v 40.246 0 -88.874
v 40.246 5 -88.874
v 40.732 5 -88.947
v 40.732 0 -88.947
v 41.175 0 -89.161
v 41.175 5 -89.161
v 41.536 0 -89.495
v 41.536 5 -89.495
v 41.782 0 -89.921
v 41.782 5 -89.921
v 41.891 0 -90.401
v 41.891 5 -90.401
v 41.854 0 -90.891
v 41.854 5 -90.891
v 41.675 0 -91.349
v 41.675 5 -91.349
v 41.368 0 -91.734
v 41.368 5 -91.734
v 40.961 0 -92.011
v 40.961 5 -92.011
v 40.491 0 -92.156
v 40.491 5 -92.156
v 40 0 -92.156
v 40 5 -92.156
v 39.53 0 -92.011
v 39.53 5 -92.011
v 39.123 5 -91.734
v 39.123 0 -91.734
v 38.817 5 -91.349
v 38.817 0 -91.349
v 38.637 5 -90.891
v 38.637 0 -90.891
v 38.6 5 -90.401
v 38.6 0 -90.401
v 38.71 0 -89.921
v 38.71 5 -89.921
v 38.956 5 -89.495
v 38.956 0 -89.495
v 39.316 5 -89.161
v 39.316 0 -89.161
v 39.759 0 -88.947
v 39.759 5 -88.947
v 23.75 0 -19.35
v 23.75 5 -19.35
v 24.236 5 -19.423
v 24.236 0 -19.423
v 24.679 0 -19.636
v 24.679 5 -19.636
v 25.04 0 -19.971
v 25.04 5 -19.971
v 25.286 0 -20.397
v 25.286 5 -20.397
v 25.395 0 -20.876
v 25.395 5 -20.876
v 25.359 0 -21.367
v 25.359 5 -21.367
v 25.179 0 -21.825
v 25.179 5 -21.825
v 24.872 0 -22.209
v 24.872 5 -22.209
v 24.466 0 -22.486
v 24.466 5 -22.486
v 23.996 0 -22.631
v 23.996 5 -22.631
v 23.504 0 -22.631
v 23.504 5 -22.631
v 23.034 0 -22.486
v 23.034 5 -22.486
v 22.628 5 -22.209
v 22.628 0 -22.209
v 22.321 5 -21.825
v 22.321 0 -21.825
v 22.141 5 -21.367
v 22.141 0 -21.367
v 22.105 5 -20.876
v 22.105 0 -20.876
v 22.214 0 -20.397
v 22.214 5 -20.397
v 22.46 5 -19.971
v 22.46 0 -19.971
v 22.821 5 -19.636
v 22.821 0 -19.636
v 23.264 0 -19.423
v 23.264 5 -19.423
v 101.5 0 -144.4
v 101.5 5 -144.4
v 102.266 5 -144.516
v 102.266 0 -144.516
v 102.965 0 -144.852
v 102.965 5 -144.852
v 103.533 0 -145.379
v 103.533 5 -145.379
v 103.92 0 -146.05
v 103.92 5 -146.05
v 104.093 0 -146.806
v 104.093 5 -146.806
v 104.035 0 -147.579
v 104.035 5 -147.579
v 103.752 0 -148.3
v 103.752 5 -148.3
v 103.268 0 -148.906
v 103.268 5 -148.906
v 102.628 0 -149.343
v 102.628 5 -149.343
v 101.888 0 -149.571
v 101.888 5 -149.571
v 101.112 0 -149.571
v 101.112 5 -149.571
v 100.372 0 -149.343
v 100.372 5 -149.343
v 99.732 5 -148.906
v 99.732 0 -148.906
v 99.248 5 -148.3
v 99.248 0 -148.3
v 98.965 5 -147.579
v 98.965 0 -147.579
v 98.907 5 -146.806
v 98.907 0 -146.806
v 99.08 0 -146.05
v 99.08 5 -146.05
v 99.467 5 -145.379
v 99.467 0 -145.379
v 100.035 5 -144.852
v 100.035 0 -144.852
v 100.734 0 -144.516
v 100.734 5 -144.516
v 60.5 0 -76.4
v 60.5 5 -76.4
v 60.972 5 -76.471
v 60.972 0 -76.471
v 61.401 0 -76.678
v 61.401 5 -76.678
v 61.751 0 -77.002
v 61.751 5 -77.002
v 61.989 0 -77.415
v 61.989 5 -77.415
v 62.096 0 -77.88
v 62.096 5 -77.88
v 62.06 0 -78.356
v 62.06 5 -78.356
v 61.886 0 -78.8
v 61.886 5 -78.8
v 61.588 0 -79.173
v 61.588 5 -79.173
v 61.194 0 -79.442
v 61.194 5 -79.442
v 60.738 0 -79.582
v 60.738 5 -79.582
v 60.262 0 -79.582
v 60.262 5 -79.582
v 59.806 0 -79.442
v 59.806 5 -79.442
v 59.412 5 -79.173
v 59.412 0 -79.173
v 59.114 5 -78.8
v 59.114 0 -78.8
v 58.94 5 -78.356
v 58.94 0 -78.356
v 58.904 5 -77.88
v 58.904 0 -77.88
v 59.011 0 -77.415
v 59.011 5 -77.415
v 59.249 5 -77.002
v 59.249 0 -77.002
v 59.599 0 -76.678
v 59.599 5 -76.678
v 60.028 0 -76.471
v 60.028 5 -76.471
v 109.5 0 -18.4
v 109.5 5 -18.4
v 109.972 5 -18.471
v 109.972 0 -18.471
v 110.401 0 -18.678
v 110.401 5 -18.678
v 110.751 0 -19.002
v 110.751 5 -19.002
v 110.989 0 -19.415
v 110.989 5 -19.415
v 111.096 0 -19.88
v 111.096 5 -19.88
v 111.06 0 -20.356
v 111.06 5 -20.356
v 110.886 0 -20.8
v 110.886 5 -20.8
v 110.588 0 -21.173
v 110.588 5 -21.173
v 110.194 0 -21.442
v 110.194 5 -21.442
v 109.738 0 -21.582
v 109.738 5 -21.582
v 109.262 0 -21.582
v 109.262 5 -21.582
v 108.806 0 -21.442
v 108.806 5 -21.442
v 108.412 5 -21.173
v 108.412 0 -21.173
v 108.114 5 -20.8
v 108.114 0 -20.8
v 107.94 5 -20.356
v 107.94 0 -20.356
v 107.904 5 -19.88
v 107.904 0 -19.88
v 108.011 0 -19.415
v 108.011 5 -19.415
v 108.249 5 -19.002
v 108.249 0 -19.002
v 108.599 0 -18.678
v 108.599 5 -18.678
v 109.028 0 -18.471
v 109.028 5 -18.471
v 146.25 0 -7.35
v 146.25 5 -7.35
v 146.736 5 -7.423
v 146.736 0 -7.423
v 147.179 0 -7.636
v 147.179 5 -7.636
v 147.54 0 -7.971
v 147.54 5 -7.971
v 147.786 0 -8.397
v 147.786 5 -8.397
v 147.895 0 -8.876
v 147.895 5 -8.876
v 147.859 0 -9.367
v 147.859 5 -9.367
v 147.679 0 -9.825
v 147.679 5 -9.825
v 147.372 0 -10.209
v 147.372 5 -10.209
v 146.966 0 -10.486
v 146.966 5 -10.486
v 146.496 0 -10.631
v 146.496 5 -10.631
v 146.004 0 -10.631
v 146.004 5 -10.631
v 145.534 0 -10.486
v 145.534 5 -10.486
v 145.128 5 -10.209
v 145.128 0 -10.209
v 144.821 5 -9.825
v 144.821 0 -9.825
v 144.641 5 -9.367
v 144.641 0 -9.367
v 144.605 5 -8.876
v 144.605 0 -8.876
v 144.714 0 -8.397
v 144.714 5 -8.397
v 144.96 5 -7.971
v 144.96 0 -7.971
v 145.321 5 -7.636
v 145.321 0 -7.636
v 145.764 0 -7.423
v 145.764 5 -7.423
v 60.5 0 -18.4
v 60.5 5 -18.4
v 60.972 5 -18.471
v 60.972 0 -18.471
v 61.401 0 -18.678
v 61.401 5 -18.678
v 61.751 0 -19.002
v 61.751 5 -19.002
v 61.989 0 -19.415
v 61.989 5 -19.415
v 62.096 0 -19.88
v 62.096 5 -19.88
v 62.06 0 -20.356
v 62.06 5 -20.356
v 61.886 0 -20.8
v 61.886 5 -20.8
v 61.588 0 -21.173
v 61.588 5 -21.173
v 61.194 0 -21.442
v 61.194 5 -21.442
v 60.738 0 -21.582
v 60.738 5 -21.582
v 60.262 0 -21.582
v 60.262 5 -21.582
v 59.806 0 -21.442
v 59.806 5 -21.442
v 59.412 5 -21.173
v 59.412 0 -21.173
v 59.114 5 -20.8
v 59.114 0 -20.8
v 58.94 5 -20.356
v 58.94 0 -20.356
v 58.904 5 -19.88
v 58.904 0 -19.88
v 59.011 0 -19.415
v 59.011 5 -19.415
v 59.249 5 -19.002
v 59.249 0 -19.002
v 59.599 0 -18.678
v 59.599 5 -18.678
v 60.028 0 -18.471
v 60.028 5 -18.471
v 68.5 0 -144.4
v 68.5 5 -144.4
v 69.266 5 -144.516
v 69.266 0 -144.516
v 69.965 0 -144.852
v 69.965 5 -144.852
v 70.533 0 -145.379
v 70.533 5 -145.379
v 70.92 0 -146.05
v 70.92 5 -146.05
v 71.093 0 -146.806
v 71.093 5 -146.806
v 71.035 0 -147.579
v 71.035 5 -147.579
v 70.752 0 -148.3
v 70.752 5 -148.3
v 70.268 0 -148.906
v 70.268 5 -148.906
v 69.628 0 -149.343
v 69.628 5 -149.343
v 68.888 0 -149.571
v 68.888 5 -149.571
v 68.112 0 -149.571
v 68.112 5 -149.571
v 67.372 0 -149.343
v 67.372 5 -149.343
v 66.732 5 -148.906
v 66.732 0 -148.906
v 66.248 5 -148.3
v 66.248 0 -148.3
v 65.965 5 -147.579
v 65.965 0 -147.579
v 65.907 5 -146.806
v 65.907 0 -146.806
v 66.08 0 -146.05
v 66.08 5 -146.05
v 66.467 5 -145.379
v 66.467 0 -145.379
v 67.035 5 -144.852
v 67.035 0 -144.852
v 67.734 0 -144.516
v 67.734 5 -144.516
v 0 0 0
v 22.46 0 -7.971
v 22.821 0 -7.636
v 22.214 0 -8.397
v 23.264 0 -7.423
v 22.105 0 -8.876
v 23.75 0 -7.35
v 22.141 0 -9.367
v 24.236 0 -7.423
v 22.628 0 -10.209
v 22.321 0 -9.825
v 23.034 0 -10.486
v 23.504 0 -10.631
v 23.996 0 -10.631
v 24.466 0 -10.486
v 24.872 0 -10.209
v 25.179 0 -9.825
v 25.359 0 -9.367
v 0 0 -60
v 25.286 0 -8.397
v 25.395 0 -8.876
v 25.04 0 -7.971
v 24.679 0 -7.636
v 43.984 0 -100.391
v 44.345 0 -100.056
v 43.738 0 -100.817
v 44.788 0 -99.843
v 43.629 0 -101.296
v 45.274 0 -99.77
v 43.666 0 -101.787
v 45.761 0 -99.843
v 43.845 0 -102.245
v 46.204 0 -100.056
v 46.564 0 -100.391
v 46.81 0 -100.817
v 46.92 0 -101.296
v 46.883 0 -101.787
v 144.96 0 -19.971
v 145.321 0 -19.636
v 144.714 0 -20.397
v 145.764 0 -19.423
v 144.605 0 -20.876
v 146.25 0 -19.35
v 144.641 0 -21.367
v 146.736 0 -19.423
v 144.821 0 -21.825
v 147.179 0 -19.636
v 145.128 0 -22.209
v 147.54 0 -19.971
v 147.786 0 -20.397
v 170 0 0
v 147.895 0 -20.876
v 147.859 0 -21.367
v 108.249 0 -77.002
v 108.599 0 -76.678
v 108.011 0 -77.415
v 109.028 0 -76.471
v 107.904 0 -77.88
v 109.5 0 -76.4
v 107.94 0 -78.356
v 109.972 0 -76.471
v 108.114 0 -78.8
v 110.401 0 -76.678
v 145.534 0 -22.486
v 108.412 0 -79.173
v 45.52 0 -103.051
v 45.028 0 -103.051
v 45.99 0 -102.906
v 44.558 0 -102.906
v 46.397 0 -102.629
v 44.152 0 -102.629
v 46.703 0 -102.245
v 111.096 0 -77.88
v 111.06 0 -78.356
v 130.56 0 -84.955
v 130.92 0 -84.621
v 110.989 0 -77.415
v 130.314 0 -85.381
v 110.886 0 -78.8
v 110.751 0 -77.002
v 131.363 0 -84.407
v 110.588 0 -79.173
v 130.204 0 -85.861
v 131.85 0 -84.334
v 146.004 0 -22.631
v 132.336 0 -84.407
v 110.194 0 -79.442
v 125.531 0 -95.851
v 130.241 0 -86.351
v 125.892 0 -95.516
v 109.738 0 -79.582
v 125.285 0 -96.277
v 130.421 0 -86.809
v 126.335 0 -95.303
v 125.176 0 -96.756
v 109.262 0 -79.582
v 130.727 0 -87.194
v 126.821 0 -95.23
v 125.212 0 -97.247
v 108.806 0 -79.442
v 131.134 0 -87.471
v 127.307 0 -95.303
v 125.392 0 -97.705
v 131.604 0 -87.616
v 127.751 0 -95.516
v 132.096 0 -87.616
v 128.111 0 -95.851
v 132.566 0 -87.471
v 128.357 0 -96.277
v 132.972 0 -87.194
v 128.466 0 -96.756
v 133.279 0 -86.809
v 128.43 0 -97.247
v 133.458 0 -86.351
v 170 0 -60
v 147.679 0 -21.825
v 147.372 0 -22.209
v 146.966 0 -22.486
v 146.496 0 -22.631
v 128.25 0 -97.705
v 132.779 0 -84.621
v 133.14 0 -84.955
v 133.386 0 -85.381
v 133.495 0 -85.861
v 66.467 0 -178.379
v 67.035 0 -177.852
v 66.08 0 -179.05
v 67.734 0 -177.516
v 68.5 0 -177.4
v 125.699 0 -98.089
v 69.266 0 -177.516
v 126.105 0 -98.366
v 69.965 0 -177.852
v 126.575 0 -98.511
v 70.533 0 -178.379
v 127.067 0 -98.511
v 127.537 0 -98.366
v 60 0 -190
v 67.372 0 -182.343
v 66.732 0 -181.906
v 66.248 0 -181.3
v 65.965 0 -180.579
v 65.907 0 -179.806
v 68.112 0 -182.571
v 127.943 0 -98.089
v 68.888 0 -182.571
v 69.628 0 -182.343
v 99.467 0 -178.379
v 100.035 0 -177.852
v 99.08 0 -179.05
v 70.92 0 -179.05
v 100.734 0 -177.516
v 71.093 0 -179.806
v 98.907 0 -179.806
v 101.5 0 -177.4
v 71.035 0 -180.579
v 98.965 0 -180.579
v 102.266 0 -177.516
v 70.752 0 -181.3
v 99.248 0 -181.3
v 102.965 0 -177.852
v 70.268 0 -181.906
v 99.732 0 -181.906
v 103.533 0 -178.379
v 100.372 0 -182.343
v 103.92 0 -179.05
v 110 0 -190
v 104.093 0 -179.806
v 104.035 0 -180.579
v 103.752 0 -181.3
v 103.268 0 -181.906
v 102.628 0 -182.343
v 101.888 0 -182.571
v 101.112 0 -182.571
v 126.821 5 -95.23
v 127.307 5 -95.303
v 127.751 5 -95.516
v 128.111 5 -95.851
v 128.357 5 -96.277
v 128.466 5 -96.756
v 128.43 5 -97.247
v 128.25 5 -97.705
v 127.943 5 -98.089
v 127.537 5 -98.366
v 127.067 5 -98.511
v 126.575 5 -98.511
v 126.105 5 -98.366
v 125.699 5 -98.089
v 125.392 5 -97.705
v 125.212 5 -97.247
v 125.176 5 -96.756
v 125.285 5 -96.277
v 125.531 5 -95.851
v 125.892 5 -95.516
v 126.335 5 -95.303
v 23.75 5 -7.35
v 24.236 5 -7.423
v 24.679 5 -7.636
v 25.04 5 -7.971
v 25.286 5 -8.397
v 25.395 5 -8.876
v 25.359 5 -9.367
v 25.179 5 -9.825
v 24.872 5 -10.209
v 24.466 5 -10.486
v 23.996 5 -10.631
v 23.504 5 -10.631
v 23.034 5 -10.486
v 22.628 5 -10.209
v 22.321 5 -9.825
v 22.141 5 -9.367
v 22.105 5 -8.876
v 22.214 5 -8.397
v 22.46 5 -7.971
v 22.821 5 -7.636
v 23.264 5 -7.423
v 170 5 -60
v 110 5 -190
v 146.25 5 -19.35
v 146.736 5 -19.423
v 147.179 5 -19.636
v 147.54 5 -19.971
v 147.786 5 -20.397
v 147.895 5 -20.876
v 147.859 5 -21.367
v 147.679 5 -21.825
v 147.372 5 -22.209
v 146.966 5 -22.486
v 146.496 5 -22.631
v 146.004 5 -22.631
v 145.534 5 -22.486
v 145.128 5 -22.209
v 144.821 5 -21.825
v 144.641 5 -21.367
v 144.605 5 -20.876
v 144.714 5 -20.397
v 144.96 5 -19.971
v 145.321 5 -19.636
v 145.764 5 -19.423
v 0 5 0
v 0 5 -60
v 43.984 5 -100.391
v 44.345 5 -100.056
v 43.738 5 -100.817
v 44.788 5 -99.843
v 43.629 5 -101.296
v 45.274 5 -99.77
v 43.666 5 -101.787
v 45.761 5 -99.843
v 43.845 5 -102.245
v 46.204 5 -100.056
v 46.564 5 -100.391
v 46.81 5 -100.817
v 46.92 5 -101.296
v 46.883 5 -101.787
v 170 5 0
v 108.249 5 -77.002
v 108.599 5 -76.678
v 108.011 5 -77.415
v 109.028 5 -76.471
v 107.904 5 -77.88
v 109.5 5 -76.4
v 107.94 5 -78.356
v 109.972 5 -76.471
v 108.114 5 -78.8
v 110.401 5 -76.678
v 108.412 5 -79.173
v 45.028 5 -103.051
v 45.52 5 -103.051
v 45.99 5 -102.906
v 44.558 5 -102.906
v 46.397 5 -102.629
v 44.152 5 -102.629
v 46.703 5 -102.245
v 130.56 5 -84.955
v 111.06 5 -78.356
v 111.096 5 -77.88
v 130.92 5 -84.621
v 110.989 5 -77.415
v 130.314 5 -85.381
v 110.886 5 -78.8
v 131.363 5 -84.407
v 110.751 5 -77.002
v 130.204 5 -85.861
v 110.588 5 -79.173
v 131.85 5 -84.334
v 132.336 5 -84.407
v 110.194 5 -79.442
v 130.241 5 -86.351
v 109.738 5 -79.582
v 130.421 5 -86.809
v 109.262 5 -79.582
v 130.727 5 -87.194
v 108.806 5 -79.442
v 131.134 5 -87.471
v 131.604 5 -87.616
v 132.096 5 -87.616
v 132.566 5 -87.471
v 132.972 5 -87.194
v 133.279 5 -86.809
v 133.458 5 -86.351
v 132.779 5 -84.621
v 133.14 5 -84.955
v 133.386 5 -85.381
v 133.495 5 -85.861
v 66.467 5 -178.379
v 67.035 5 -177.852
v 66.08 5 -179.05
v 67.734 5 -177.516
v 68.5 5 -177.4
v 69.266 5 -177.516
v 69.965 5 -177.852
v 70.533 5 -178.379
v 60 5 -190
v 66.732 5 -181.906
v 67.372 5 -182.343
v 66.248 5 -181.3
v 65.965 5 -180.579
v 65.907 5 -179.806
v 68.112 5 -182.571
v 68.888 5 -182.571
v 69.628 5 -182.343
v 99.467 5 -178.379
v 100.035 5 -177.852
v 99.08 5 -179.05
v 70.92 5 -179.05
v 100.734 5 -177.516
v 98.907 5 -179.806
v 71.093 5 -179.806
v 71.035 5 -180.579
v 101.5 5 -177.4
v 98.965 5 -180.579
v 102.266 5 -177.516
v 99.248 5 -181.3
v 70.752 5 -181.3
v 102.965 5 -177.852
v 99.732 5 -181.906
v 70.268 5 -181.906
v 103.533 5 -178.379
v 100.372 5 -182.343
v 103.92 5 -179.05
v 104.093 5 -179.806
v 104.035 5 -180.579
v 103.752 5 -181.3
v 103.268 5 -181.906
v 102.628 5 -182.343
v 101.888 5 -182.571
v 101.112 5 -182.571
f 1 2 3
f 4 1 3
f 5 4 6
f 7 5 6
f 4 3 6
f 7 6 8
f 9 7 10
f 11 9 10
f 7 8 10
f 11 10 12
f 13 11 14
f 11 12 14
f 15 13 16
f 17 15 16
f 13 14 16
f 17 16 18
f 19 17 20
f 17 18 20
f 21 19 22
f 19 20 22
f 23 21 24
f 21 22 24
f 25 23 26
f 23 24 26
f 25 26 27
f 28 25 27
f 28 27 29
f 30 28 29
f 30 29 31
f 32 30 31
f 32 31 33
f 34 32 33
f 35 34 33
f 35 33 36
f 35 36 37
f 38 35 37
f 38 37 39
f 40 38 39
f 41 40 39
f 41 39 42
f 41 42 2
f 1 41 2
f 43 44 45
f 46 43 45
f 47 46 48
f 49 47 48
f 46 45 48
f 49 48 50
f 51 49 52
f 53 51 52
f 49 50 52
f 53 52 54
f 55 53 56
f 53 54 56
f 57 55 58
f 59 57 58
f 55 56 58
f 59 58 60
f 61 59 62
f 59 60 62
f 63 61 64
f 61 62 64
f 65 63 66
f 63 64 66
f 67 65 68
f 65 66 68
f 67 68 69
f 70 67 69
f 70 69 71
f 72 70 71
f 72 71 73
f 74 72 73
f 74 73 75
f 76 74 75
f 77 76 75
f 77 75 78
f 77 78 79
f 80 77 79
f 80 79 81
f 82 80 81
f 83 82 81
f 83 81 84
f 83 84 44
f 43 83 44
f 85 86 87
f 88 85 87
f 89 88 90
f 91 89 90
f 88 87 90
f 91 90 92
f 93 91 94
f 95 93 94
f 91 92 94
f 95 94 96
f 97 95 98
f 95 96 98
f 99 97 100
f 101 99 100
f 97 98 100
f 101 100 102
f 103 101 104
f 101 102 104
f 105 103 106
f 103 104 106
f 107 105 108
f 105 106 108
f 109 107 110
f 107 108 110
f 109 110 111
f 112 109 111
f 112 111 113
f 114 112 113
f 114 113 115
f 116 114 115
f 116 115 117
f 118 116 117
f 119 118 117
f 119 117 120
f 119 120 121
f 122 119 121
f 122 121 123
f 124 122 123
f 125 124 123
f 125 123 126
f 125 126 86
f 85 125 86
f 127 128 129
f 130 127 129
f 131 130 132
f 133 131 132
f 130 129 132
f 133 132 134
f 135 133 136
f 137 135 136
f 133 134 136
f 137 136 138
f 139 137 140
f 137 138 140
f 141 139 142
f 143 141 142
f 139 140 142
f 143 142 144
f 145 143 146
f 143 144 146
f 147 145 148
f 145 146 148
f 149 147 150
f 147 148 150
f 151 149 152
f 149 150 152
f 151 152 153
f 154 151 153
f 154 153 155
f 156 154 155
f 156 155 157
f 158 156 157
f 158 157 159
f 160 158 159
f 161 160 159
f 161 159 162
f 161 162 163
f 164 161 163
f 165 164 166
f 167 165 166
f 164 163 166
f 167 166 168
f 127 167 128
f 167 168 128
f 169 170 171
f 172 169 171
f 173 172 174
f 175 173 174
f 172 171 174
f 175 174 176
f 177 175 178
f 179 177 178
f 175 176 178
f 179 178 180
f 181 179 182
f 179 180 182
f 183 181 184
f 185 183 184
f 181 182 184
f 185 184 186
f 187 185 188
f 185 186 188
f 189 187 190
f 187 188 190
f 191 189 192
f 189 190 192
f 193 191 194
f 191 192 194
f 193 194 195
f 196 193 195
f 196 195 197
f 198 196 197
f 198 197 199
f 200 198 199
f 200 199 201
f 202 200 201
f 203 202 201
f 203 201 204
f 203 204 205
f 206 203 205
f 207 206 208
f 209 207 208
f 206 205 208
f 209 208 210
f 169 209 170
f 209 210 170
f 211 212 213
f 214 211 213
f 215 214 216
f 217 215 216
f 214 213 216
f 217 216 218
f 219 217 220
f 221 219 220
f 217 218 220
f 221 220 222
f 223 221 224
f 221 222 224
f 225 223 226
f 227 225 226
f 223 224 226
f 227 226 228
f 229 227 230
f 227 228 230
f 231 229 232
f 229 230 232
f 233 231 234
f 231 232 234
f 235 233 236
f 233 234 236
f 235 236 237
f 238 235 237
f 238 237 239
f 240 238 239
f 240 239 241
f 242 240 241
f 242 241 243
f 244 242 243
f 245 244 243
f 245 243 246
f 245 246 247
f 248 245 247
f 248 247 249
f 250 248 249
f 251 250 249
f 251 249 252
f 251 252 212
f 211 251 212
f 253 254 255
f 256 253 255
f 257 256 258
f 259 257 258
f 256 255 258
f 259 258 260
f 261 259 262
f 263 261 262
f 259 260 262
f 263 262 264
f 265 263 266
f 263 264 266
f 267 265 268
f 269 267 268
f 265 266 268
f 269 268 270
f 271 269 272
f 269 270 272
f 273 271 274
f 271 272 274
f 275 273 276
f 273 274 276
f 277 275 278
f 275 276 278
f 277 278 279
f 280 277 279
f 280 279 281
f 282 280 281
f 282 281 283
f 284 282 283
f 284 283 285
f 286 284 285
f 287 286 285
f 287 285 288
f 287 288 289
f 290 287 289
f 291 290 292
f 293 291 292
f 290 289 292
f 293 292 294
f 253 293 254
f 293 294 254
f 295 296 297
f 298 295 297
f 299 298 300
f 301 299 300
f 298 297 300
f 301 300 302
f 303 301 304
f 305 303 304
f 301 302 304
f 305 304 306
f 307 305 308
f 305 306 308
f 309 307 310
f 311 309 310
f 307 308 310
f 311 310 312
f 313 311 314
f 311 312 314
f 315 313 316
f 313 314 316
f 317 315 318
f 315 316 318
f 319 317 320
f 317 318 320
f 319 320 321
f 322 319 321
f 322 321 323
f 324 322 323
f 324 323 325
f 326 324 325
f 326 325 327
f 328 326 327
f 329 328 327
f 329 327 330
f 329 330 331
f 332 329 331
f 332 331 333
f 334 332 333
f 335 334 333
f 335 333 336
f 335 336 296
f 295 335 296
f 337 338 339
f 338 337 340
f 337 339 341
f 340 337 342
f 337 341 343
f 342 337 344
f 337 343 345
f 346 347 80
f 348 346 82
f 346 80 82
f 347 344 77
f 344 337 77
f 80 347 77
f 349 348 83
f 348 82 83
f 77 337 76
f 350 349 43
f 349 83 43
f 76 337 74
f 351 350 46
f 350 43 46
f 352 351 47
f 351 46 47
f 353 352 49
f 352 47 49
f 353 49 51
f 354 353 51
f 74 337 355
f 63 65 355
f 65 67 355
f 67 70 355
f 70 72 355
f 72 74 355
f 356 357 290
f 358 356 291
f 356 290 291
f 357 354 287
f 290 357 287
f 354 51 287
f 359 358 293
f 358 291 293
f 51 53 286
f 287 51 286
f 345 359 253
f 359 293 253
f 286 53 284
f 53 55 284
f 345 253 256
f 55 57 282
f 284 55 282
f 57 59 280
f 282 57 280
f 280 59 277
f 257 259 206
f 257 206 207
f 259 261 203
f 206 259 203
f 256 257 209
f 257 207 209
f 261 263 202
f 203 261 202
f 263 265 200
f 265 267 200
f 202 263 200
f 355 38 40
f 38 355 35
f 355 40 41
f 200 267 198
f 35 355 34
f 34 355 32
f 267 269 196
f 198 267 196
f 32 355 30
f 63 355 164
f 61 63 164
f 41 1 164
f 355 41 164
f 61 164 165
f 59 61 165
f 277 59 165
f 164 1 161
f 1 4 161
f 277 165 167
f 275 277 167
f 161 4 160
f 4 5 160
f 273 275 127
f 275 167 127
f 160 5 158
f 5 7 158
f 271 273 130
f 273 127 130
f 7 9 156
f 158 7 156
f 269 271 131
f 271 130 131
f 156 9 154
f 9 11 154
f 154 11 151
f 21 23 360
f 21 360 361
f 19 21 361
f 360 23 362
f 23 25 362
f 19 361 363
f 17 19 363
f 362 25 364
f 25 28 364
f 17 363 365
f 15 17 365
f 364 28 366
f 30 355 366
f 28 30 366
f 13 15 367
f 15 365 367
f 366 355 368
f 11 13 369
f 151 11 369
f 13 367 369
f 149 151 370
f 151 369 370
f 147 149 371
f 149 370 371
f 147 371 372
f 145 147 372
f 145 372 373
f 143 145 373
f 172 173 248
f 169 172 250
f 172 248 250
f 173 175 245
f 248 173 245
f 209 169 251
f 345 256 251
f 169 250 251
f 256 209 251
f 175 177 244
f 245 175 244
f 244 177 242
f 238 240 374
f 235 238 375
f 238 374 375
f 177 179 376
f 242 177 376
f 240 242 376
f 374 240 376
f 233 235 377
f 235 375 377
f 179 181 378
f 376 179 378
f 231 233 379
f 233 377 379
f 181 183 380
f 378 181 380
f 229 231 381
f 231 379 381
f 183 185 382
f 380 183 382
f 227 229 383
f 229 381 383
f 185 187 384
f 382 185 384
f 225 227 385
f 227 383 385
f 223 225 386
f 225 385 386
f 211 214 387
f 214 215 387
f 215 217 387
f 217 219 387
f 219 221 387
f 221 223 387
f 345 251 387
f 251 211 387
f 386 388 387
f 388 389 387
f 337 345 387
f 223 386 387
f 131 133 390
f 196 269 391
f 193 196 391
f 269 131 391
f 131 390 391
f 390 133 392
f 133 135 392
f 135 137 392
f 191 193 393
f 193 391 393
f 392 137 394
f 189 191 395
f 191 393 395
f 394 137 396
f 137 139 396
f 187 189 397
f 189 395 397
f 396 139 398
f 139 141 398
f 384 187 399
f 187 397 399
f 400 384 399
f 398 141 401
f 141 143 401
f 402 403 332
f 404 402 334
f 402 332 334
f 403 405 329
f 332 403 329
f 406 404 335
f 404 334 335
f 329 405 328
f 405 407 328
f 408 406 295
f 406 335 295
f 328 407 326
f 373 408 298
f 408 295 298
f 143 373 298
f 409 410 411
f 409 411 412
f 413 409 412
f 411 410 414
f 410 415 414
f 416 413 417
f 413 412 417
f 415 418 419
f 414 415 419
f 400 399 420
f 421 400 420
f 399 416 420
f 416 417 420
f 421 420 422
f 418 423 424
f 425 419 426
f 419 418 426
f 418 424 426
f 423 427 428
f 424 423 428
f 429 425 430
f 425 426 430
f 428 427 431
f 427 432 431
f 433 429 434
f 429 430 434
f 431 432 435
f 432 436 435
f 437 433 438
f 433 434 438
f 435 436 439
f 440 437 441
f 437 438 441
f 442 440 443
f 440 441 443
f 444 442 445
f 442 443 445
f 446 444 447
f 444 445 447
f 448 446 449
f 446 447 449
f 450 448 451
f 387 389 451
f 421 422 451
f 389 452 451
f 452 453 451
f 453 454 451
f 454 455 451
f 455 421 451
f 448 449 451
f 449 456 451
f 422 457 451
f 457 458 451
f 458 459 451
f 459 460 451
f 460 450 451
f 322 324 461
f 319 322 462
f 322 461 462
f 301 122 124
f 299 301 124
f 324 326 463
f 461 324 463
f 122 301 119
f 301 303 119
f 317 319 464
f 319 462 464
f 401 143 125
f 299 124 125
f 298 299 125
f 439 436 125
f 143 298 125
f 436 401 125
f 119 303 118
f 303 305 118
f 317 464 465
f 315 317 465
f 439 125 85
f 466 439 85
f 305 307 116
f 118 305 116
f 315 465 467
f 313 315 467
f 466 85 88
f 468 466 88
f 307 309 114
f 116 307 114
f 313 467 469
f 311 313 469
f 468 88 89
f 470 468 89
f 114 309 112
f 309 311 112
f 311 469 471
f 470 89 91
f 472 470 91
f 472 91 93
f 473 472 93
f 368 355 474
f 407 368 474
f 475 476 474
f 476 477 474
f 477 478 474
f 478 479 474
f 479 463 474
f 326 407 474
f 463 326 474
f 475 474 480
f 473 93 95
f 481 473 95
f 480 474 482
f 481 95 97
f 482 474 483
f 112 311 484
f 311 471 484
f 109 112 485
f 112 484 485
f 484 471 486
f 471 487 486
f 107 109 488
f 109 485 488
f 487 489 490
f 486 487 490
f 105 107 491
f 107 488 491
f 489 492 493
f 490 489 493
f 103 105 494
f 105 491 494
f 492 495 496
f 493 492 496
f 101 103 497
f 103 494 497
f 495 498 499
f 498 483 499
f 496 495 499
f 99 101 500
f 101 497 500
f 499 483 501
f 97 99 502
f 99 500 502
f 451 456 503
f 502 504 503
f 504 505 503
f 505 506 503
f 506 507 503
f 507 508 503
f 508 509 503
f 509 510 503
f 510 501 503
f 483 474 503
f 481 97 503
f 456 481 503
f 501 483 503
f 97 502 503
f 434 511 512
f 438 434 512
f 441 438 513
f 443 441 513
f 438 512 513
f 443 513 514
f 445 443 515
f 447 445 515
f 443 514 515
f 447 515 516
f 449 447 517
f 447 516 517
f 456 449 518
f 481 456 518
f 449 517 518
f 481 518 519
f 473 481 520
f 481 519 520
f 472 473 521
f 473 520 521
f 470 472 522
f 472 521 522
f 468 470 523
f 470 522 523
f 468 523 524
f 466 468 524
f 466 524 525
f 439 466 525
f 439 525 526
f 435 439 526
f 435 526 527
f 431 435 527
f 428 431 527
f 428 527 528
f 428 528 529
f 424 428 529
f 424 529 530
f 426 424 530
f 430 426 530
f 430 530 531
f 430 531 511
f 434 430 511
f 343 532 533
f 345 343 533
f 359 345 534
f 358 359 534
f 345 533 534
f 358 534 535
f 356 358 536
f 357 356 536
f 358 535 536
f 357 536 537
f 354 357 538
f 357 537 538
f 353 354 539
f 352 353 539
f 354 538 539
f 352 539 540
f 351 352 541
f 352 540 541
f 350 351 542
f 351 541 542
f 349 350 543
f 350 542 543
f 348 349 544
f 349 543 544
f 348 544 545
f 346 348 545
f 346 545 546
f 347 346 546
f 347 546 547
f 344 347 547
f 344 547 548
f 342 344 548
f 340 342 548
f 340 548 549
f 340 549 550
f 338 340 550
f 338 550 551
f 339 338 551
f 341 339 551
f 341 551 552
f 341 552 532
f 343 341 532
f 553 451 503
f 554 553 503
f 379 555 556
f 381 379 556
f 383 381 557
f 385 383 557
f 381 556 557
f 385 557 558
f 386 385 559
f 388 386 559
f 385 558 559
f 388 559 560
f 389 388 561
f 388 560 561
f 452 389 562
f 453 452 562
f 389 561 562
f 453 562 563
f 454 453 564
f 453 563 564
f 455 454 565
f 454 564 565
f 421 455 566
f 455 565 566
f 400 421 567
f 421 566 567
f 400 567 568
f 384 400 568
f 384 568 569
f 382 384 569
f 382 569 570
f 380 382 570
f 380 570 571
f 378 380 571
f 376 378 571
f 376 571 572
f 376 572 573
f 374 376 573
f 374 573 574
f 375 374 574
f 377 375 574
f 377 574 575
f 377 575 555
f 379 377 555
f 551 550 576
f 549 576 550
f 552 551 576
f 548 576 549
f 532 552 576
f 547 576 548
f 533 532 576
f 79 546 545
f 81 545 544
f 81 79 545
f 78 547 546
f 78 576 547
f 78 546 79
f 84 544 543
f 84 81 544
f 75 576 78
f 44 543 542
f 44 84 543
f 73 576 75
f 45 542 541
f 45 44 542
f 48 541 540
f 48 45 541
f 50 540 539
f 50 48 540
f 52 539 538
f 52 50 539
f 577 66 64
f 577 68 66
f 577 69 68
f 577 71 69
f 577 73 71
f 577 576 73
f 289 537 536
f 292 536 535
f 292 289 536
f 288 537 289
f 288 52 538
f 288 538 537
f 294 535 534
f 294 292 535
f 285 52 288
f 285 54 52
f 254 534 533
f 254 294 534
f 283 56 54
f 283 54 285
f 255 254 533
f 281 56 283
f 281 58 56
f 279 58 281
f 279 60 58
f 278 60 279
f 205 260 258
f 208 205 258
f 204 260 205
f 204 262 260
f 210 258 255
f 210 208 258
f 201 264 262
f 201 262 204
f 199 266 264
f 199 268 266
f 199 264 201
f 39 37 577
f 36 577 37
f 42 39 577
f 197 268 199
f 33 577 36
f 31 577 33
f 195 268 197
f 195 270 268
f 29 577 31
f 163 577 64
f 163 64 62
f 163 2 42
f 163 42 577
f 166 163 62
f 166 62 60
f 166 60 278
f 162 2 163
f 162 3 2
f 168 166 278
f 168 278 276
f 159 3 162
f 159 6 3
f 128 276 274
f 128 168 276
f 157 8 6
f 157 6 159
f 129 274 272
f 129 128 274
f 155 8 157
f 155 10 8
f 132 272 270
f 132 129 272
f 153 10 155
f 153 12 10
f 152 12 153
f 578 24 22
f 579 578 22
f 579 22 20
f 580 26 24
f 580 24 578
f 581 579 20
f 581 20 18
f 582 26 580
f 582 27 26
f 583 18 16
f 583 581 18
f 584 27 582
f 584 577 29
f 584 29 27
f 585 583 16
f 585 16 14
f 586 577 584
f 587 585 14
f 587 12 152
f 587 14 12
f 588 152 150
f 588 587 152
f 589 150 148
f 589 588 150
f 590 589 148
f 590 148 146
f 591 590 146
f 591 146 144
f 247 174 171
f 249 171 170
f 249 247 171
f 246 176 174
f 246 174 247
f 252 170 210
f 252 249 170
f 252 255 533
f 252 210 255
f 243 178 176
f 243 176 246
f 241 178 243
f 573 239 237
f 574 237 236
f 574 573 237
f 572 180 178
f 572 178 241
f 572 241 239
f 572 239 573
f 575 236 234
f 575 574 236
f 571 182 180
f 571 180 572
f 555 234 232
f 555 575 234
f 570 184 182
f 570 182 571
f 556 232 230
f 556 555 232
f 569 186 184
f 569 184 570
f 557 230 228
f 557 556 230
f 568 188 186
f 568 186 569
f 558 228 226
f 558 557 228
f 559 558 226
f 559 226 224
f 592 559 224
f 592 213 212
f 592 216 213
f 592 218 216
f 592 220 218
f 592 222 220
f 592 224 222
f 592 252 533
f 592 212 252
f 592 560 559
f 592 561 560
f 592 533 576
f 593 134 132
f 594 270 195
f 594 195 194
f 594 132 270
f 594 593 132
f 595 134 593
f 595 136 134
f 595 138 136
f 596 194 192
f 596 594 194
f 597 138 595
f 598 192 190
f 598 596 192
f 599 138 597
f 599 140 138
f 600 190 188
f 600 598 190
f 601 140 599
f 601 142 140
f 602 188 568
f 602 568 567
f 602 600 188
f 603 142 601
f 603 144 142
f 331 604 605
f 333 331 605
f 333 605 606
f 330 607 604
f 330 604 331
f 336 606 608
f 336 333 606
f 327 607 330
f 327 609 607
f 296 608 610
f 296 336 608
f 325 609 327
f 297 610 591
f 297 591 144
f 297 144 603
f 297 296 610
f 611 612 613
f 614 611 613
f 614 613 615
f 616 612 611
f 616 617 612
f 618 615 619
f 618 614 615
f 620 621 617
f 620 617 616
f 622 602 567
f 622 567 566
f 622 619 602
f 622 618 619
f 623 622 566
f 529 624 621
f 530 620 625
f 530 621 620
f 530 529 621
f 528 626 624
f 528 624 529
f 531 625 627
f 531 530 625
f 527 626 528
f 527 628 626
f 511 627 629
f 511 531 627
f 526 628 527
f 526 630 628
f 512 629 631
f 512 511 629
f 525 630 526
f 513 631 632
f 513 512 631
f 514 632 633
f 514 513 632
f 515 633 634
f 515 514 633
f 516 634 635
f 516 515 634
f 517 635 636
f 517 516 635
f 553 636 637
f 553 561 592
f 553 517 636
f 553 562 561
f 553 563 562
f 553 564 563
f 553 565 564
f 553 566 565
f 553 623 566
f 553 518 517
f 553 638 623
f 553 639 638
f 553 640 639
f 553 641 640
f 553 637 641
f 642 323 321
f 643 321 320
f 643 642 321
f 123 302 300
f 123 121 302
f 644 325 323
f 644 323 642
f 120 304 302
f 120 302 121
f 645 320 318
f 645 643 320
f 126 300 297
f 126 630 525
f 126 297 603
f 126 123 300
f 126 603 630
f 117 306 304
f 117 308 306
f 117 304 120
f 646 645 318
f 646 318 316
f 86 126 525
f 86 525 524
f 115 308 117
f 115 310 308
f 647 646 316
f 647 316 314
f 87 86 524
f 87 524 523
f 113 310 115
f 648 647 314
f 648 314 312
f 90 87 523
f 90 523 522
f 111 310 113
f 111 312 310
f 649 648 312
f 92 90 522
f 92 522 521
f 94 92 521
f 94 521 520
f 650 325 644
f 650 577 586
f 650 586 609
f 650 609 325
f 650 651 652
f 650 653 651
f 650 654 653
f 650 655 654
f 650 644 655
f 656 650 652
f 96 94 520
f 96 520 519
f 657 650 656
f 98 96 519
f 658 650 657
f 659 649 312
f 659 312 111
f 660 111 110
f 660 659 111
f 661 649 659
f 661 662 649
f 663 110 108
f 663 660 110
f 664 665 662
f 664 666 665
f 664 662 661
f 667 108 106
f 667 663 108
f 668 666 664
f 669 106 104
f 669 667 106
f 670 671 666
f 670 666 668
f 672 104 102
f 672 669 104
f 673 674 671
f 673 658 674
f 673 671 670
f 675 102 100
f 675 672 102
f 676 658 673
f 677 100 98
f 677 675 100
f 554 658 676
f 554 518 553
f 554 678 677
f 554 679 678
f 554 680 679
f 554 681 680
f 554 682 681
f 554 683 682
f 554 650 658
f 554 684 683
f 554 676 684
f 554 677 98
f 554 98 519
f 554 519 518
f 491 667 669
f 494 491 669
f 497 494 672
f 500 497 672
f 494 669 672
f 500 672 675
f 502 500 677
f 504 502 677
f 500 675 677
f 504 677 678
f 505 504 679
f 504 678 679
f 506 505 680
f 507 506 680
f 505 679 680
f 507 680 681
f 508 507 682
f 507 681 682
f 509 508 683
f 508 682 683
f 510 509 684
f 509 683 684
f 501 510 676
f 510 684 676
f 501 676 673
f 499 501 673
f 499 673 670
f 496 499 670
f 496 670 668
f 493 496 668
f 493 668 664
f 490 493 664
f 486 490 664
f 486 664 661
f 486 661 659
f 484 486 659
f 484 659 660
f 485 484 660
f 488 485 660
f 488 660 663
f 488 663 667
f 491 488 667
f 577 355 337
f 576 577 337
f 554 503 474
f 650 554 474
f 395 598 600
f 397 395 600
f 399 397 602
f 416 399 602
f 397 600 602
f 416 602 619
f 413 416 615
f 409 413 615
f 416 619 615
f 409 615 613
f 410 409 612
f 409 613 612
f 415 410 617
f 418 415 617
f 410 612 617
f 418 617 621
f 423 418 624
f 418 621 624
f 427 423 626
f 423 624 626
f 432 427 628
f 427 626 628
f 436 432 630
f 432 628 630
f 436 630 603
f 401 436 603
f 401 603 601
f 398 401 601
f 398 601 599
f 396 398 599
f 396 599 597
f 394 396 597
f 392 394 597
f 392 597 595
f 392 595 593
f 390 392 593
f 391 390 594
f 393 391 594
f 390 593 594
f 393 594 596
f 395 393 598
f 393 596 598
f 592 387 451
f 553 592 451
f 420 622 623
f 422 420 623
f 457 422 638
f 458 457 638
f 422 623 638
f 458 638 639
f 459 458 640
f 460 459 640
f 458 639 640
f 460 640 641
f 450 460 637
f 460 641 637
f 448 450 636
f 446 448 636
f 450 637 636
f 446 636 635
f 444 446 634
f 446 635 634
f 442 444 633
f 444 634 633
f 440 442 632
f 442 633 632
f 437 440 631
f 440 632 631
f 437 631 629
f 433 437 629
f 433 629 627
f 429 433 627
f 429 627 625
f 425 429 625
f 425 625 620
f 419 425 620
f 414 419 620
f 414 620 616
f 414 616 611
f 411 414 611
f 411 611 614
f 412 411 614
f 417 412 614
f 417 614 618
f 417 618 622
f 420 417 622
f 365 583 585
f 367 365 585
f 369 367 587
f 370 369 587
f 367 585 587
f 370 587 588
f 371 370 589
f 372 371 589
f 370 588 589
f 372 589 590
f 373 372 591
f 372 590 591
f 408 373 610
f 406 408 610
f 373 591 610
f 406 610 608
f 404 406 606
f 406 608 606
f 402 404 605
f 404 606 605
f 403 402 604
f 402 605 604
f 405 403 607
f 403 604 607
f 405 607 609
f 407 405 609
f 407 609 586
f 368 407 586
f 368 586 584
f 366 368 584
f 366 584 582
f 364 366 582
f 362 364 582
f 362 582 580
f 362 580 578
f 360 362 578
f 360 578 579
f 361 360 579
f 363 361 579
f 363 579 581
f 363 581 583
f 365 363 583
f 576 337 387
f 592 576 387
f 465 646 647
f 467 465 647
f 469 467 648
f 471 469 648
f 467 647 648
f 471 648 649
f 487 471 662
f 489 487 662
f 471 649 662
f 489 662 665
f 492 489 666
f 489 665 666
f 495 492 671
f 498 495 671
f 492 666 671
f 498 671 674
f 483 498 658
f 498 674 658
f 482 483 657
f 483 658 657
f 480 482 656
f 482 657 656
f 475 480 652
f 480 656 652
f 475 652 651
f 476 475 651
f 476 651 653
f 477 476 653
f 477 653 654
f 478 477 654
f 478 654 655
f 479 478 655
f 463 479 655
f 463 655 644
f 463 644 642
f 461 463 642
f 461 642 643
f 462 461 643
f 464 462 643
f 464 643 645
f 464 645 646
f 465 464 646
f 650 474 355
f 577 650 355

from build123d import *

# Parameters (mm, degrees)
EXTRUDE_1_DEPTH             = 5
SKETCH_2_R                  = 1.6
CUT_EXTRUDE_1_DEPTH         = 5
PATTERN_LINEAR_1_COUNT      = 2
PATTERN_LINEAR_1_PITCH      = 58
PATTERN_LINEAR_1_COUNT_DIR2 = 2
PATTERN_LINEAR_1_PITCH_DIR2 = 49
SKETCH_3_R                  = 2.6
CUT_EXTRUDE_2_DEPTH         = 10
PATTERN_LINEAR_2_COUNT      = 2
PATTERN_LINEAR_2_PITCH      = 33
PATTERN_LINEAR_2_COUNT_DIR2 = 2
PATTERN_LINEAR_2_PITCH_DIR2 = 33
SKETCH_4_R                  = 1.65
CUT_EXTRUDE_4_DEPTH         = 10


with BuildPart() as part:
    # Эскиз1 → Бобышка-Вытянуть1 (new body)
    with BuildSketch(Plane(origin=(0, 0, 0), x_dir=(1, 0, 0), z_dir=(0, 1, 0))):
        Polygon((0, 0), (170, 0), (170, 60), (110, 190), (60, 190), (0, 60), align=None)
    extrude(amount=EXTRUDE_1_DEPTH)

    # Эскиз2 → Вырез-Вытянуть1 (cut)
    with BuildSketch(Plane(origin=(0, 5, 0), x_dir=(1, 0, 0), z_dir=(0, 1, 0))):
        with Locations(Location((60.5, 20, 0), (0, 0, 270))):
            Circle(SKETCH_2_R)
    cut_extrude_1 = extrude(amount=-CUT_EXTRUDE_1_DEPTH, mode=Mode.SUBTRACT)

    # Линейный массив1: Cut-Extrude 1 2 × 2
    with Locations(*[(j * PATTERN_LINEAR_1_PITCH_DIR2, 0, -i * PATTERN_LINEAR_1_PITCH) for i in range(PATTERN_LINEAR_1_COUNT) for j in range(PATTERN_LINEAR_1_COUNT_DIR2) if (i, j) != (0, 0)]):
        add(cut_extrude_1, mode=Mode.SUBTRACT)

    # Эскиз3 → Вырез-Вытянуть2 (cut)
    with BuildSketch(Plane(origin=(0, 5, 0), x_dir=(1, 0, 0), z_dir=(0, 1, 0))):
        with Locations(Location((101.5, 180, 0), (0, 0, 270))):
            Circle(SKETCH_3_R)
    cut_extrude_2 = extrude(amount=-CUT_EXTRUDE_2_DEPTH, mode=Mode.SUBTRACT)

    # Линейный массив2: Cut-Extrude 2 2 × 2
    with Locations(*[(-i * PATTERN_LINEAR_2_PITCH, 0, j * PATTERN_LINEAR_2_PITCH_DIR2) for i in range(PATTERN_LINEAR_2_COUNT) for j in range(PATTERN_LINEAR_2_COUNT_DIR2) if (i, j) != (0, 0)]):
        add(cut_extrude_2, mode=Mode.SUBTRACT)

    # Эскиз4 → Вырез-Вытянуть4 (cut)
    with BuildSketch(Plane(origin=(0, 5, 0), x_dir=(1, 0, 0), z_dir=(0, 1, 0))):
        with Locations(Location((23.75, 8.999743724, 0), (0, 0, 270))):
            Circle(SKETCH_4_R)
        with Locations(Location((23.75, 20.999743724, 0), (0, 0, 270))):
            Circle(SKETCH_4_R)
        with Locations(Location((146.25, 20.999743724, 0), (0, 0, 270))):
            Circle(SKETCH_4_R)
        with Locations(Location((146.25, 8.999743724, 0), (0, 0, 270))):
            Circle(SKETCH_4_R)
        with Locations(Location((45.274277733, 101.419560045, 0), (0, 0, 270))):
            Circle(SKETCH_4_R)
        with Locations(Location((40.245579603, 90.524047431, 0), (0, 0, 270))):
            Circle(SKETCH_4_R)
        with Locations(Location((126.821084869, 96.879607741, 0), (0, 0, 270))):
            Circle(SKETCH_4_R)
        with Locations(Location((131.849782999, 85.984095127, 0), (0, 0, 270))):
            Circle(SKETCH_4_R)
    extrude(amount=-CUT_EXTRUDE_4_DEPTH, mode=Mode.SUBTRACT)


solid = part.part
